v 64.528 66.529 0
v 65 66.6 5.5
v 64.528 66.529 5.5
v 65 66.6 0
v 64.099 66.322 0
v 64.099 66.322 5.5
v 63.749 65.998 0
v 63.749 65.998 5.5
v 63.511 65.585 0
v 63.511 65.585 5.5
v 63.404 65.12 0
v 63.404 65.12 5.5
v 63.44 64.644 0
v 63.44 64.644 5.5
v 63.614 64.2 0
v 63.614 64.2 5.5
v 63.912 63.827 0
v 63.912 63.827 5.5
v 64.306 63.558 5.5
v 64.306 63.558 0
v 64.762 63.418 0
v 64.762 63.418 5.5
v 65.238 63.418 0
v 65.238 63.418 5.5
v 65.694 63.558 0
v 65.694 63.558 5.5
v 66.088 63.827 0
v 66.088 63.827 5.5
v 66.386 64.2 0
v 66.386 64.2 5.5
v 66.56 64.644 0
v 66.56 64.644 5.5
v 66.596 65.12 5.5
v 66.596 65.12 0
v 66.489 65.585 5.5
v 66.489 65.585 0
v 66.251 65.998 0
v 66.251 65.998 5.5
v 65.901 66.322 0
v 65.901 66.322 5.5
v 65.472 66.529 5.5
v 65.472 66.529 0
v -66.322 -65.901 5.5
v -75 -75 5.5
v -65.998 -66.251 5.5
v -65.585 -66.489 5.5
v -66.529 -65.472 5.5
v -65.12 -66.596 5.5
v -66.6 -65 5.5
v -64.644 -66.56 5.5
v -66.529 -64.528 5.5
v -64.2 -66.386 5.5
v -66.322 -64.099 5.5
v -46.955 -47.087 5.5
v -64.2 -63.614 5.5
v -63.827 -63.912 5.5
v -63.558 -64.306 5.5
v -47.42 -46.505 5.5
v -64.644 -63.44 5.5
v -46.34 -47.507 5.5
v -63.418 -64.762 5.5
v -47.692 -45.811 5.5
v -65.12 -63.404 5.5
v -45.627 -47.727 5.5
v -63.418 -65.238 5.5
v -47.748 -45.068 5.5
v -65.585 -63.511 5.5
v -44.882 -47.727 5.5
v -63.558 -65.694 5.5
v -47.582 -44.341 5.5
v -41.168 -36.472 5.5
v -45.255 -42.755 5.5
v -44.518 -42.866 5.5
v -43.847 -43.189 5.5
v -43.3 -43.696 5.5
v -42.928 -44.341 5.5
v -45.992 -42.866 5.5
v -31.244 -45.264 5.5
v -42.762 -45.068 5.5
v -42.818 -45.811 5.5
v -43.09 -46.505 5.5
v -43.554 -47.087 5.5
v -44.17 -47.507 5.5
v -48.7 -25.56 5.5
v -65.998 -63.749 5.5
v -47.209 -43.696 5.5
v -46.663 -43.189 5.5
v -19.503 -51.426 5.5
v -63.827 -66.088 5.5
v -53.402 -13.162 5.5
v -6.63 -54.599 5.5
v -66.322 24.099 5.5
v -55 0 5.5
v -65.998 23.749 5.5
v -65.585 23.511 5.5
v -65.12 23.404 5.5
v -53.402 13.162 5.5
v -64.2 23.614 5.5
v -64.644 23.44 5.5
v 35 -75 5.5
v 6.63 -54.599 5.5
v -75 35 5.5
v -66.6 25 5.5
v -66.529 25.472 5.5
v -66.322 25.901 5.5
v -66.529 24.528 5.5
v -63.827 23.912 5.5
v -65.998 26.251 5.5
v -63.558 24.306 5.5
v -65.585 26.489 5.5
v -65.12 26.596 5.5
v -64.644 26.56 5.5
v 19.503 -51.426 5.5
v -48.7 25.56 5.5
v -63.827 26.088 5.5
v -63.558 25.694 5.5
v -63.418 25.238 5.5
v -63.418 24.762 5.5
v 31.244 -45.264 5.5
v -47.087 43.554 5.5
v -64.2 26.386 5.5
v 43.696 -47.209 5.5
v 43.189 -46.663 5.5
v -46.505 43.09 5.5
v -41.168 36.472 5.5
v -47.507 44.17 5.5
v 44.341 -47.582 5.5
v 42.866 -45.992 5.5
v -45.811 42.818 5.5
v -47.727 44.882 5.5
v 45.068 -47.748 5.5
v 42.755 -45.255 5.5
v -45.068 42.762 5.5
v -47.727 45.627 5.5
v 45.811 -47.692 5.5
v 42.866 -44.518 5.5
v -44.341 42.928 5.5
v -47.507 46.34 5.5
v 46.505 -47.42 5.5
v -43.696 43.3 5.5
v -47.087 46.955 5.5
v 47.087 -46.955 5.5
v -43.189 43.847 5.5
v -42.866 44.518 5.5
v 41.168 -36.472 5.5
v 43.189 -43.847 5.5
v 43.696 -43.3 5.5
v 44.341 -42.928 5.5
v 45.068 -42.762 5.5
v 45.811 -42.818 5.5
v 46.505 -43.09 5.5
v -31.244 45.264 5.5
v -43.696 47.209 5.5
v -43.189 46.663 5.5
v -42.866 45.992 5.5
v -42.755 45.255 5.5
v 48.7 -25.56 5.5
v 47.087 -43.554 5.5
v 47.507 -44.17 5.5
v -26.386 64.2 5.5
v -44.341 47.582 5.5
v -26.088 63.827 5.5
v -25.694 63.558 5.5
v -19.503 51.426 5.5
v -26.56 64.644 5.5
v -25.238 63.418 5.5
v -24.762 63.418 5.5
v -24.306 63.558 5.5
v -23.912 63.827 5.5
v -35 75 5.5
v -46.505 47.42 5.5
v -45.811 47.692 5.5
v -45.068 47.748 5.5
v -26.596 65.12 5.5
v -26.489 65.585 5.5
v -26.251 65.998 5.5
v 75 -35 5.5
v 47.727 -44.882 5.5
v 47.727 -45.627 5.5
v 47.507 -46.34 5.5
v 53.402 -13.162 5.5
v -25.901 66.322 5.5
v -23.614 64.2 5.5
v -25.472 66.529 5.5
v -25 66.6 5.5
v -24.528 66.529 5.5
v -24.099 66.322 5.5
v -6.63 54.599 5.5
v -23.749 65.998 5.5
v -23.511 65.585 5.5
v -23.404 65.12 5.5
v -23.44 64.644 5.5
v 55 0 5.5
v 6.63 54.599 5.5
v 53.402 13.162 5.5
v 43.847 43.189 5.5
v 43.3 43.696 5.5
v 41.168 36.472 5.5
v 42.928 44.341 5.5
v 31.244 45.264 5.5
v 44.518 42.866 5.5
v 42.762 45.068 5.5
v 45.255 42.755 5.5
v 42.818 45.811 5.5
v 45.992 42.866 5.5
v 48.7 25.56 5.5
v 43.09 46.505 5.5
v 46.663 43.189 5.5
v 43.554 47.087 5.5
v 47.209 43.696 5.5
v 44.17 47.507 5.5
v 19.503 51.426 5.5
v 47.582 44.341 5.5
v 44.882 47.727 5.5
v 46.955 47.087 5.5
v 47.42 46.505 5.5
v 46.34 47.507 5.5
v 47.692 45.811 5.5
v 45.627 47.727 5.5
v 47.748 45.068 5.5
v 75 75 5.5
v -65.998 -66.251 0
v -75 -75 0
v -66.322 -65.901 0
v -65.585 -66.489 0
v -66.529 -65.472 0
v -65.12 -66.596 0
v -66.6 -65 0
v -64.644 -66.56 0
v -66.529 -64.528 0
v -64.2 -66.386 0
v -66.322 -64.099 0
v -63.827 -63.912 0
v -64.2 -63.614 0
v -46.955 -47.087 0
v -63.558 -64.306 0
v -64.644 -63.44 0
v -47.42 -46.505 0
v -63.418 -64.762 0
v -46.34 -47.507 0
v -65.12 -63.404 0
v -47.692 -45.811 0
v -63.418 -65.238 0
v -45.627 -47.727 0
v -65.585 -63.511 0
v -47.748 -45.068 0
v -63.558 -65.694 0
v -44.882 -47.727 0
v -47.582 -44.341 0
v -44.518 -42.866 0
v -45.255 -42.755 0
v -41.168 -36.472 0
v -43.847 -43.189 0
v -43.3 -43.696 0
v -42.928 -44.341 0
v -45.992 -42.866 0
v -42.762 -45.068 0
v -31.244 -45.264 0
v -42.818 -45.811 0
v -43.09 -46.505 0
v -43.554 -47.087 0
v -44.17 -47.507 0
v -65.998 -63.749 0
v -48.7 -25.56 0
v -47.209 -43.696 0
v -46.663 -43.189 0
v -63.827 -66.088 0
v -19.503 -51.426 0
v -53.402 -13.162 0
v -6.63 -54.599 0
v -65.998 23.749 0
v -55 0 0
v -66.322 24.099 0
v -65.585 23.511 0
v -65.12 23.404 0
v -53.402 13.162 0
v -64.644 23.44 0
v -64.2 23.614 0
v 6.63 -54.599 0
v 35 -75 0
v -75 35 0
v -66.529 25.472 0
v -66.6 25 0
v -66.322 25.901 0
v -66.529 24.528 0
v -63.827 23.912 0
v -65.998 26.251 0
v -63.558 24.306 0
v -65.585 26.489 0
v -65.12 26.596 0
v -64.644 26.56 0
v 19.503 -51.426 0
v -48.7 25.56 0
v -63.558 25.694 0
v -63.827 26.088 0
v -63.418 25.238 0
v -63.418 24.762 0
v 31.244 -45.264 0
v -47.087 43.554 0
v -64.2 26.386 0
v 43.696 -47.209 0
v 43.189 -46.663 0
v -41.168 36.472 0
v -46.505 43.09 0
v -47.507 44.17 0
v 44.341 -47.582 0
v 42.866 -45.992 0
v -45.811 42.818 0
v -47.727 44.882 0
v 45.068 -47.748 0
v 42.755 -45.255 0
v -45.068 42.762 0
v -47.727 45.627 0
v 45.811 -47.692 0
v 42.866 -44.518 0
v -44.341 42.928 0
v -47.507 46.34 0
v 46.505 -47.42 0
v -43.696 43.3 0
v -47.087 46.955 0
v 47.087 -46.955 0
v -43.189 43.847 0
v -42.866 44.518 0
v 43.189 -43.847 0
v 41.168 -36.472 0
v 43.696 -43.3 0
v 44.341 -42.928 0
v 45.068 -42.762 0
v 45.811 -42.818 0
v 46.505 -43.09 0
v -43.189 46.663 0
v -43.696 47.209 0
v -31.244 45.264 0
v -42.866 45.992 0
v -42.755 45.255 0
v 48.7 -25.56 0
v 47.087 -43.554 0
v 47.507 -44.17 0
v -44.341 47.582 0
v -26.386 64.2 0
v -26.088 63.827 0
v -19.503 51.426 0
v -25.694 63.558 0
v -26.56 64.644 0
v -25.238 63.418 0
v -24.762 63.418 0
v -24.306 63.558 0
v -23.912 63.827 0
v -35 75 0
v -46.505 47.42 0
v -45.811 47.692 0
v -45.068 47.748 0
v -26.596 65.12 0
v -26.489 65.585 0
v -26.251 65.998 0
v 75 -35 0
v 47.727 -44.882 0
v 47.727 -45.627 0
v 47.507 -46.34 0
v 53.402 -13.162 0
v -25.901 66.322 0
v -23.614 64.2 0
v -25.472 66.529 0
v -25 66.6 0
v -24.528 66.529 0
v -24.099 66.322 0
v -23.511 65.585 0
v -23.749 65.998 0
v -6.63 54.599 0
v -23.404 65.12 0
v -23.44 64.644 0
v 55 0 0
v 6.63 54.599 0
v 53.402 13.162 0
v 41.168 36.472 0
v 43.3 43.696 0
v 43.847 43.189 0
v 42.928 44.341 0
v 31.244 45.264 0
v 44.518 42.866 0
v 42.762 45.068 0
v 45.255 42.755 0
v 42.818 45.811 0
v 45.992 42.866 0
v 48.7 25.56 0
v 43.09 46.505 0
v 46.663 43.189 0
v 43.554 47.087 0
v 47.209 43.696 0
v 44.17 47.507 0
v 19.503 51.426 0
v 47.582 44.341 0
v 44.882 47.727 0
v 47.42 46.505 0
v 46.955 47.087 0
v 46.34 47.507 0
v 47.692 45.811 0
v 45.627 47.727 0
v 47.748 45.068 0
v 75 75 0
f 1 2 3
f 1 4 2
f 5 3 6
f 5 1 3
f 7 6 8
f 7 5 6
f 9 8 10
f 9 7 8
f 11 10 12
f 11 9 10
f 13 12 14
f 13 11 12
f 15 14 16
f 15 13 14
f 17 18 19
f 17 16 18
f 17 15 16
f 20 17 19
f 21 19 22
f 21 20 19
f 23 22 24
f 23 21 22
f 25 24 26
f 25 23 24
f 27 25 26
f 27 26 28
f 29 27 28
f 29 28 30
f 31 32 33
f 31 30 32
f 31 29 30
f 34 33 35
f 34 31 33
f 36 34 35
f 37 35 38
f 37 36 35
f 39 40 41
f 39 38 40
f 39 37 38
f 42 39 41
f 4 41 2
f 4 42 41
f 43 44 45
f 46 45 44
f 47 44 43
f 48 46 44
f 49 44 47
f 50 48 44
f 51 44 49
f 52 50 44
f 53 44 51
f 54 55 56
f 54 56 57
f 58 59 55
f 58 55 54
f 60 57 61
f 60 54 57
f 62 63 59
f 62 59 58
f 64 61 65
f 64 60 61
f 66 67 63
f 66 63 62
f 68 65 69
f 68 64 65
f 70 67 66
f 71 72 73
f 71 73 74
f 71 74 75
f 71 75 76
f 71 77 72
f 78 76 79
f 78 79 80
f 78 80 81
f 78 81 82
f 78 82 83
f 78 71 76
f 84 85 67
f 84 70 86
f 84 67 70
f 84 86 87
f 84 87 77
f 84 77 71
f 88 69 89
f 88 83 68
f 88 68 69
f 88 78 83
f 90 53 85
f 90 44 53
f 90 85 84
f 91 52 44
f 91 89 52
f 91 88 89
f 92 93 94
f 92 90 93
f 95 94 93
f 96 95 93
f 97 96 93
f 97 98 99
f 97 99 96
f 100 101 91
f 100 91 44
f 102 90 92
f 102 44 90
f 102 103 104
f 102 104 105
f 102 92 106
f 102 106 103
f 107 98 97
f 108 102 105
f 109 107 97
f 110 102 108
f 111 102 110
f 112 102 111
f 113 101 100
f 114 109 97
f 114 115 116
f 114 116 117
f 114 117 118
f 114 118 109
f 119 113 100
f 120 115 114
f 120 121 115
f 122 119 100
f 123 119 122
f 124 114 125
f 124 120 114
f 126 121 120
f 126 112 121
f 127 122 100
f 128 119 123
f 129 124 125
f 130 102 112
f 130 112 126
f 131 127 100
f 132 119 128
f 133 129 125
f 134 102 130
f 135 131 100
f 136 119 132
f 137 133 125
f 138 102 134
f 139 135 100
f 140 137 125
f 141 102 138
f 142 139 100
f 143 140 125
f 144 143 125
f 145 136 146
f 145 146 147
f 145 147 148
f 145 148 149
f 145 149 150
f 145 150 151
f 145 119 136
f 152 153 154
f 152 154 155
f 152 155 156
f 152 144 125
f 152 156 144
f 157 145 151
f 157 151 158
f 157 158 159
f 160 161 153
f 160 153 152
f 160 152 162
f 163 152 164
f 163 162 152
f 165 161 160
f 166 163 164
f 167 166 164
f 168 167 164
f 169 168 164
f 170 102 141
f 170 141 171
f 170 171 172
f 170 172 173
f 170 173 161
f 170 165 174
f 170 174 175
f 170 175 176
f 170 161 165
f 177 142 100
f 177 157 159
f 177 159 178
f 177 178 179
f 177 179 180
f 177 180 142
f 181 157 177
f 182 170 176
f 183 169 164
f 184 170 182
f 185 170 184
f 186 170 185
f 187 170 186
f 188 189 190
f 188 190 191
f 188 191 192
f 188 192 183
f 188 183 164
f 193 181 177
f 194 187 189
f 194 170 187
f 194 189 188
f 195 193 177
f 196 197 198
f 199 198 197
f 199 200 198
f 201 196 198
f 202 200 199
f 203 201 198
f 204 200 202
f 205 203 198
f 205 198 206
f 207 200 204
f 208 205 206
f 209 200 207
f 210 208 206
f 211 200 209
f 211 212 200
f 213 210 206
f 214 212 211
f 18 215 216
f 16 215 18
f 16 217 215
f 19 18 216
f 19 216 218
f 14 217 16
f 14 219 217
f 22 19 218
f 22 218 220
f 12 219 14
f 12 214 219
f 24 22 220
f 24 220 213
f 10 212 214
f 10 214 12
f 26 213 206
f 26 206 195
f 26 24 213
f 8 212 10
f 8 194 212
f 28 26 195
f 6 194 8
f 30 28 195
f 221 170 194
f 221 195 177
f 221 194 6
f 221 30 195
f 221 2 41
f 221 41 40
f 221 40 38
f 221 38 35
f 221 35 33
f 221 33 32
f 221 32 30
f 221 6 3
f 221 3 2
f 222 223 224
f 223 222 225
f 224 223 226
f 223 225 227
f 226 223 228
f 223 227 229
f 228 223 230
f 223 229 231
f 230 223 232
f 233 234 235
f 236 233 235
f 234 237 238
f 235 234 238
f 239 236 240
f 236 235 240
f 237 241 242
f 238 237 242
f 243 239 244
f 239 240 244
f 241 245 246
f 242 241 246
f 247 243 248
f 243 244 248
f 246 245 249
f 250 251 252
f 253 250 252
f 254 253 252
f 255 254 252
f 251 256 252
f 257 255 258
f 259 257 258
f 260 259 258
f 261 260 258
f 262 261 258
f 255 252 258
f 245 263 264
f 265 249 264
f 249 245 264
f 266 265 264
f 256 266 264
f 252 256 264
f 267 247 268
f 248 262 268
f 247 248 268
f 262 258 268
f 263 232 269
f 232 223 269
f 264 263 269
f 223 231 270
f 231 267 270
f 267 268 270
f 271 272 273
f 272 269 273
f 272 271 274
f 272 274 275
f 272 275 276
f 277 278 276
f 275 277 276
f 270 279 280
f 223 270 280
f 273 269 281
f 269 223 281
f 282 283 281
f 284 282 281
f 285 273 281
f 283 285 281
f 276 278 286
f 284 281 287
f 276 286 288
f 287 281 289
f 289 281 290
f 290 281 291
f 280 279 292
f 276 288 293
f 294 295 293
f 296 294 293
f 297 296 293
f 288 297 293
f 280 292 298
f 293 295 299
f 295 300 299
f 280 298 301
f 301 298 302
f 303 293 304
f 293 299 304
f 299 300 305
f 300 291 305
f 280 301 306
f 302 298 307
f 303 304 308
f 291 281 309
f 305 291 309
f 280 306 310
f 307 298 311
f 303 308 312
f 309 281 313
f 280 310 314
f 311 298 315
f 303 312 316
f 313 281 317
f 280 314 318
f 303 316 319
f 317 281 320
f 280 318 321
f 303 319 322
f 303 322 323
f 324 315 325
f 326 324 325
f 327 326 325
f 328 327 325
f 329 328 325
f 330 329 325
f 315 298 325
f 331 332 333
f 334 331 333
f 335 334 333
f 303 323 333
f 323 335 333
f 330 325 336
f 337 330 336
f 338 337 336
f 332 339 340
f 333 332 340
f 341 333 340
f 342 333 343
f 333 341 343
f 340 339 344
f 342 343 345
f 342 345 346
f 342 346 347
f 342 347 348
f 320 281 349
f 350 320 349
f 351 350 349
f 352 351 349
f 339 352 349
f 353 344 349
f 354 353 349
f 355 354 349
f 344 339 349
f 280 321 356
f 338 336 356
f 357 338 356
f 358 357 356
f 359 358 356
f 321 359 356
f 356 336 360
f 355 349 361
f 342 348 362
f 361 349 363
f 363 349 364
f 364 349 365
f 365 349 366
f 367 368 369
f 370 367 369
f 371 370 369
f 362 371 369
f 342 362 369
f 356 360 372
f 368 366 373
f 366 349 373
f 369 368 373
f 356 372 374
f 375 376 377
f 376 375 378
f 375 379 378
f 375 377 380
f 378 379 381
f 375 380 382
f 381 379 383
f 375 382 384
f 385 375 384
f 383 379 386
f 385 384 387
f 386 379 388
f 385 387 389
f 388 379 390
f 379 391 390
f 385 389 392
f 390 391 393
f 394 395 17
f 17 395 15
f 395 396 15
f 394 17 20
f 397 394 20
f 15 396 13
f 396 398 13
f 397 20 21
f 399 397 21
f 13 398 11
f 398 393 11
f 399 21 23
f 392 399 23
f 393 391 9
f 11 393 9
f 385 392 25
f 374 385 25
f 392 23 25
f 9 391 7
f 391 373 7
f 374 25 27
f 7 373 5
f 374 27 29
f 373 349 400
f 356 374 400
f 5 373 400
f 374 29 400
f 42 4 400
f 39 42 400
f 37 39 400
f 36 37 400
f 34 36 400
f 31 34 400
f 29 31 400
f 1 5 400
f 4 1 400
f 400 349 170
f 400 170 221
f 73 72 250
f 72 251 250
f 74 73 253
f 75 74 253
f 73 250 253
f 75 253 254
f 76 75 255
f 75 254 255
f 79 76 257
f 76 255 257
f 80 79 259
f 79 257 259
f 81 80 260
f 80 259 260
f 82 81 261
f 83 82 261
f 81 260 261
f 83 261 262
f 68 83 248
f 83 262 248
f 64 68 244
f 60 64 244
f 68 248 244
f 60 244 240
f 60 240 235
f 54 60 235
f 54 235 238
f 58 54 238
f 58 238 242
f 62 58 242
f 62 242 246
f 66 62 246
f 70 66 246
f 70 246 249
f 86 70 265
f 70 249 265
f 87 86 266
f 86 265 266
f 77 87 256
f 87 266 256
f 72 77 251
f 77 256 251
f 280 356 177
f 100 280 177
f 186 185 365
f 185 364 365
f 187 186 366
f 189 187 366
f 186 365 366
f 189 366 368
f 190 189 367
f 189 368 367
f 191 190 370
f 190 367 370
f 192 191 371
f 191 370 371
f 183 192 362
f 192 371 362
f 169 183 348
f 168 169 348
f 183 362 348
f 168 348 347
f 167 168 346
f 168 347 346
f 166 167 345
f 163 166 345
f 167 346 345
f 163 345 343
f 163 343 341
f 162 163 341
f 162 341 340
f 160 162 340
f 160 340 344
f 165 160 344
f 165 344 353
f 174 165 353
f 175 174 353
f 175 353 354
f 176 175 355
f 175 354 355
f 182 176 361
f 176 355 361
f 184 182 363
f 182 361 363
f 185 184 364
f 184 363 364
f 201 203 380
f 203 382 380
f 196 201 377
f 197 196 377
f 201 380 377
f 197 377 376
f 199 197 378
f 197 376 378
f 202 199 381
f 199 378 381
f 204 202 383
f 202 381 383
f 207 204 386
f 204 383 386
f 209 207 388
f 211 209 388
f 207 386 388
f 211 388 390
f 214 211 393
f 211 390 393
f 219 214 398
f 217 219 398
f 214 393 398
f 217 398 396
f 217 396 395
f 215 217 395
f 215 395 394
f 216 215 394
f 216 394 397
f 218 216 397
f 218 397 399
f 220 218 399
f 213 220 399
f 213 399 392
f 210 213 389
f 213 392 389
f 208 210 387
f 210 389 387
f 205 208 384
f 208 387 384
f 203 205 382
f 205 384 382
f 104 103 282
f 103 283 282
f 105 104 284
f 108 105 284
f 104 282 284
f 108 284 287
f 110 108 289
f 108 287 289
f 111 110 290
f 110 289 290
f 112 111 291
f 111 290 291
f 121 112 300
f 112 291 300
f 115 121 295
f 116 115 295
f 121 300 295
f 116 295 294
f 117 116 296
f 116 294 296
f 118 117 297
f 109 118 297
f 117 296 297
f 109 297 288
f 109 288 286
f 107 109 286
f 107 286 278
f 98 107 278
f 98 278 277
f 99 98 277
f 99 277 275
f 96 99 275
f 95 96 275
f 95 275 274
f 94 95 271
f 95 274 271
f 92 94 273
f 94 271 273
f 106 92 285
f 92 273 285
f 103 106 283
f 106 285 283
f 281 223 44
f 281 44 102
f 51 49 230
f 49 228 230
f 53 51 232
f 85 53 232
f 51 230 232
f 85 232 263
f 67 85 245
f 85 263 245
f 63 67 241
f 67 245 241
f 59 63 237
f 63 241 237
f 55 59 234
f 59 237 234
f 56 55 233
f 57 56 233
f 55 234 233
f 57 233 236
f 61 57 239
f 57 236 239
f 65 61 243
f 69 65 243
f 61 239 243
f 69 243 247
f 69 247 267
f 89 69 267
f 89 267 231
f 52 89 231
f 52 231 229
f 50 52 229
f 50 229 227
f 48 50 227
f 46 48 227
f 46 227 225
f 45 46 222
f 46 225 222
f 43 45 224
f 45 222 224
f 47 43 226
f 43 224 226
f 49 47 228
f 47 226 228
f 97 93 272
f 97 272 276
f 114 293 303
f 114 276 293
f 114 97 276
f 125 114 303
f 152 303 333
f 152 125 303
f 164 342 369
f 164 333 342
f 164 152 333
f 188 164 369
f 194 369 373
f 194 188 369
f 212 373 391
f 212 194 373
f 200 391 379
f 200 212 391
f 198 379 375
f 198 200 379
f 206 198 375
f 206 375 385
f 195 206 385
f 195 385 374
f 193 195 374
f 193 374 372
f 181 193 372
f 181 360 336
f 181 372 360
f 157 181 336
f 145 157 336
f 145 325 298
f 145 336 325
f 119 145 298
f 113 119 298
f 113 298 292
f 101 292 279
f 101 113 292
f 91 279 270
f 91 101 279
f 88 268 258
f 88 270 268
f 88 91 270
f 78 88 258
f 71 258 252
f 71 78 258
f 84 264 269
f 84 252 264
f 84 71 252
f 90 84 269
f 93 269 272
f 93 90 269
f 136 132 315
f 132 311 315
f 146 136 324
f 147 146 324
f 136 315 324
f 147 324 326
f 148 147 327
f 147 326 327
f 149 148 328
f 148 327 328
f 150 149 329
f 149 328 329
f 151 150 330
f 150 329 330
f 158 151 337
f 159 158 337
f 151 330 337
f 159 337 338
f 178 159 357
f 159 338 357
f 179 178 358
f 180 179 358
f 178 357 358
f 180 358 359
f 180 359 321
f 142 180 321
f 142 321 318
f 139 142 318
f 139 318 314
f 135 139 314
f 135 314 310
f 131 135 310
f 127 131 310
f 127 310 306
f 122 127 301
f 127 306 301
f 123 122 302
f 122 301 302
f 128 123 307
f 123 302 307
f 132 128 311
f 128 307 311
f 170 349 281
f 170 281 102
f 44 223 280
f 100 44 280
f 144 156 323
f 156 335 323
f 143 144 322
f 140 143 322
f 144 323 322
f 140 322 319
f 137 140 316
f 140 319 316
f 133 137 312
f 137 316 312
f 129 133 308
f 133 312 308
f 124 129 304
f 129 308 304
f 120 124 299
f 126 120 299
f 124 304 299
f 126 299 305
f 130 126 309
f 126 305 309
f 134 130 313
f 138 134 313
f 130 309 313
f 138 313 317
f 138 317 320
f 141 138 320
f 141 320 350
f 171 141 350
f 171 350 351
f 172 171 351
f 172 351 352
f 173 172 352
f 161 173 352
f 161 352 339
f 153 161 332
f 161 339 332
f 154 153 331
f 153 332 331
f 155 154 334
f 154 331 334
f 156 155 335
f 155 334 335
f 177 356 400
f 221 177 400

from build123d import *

# Parameters (mm, degrees)
SKETCH_1_W                       = 150
SKETCH_1_H                       = 150
EXTRUDE_1_DEPTH                  = 5.5
SKETCH_2_R                       = 2.5
CUT_EXTRUDE_1_DEPTH              = 107.208521315
CUT_EXTRUDE_2_DEPTH              = 107.208521315
CUT_EXTRUDE_2_DEPTH_BACK         = 107.208521315
SKETCH_3_R                       = 55
PATTERN_CIRCULAR_1_COUNT         = 4
SKETCH_4_R                       = 1.6
CUT_EXTRUDE_3_DEPTH              = 107.208521315
CHAMFER_1_SIZE                   = 40
CHAMFER_2_SIZE                   = 40
PATTERN_LINEAR_1_COUNT           = 2
PATTERN_LINEAR_1_PITCH           = 90
PATTERN_LINEAR_2_COPY_1_SKETCH_R = 1.6
PATTERN_LINEAR_2_COPY_1_DEPTH    = 107.208521315
PATTERN_LINEAR_2_COPY_2_SKETCH_R = 1.6
PATTERN_LINEAR_2_COPY_2_DEPTH    = 107.208521315


with BuildPart() as part:
    # ｽｹｯﾁ1 → ﾎﾞｽ - 押し出し1 (new body)
    with BuildSketch(Plane.XY):
        Rectangle(SKETCH_1_W, SKETCH_1_H)
    extrude(amount=EXTRUDE_1_DEPTH)

    # ｽｹｯﾁ2 → ｶｯﾄ - 押し出し1 (cut, symmetric)
    with BuildSketch(Plane(origin=(0, 0, 0), x_dir=(-1, 0, 0), z_dir=(0, 0, -1))):
        with Locations((-45.254833996, -45.254833996)):
            Circle(SKETCH_2_R)
    cut_extrude_1 = extrude(amount=CUT_EXTRUDE_1_DEPTH, both=True, mode=Mode.SUBTRACT)

    # ｽｹｯﾁ3 → ｶｯﾄ - 押し出し2 (cut, two sides: drawn at the far end of the back side and taken through both)
    with BuildSketch(Plane(origin=(0, 0, 0), x_dir=(-1, 0, 0), z_dir=(0, 0, -1)).offset(-CUT_EXTRUDE_2_DEPTH_BACK)):
        Circle(SKETCH_3_R)
    extrude(amount=CUT_EXTRUDE_2_DEPTH + CUT_EXTRUDE_2_DEPTH_BACK, mode=Mode.SUBTRACT)

    # 円形ﾊﾟﾀｰﾝ1: ｶｯﾄ - 押し出し1 ×4 about axis
    pattern_circular_1_axis = Axis((0, 0, 0), (0, 0, 1))
    for i in range(1, PATTERN_CIRCULAR_1_COUNT):
        add(cut_extrude_1.rotate(pattern_circular_1_axis, i * 360 / PATTERN_CIRCULAR_1_COUNT), mode=Mode.SUBTRACT)

    # ｽｹｯﾁ4 → ｶｯﾄ - 押し出し3 (cut, symmetric)
    with BuildSketch(Plane(origin=(0, 0, 0), x_dir=(-1, 0, 0), z_dir=(0, 0, -1))):
        with Locations((65, -65)):
            Circle(SKETCH_4_R)
    cut_extrude_3 = extrude(amount=CUT_EXTRUDE_3_DEPTH, both=True, mode=Mode.SUBTRACT)

    # 面取り1
    chamfer_1_edges = [part.edges().sort_by_distance(p)[0] for p in [
        (-75, 75, 2.75),
    ]]
    chamfer(chamfer_1_edges, length=CHAMFER_1_SIZE)

    # 面取り2
    chamfer_2_edges = [part.edges().sort_by_distance(p)[0] for p in [
        (75, -75, 2.75),
    ]]
    chamfer(chamfer_2_edges, length=CHAMFER_2_SIZE)

    # 直線ﾊﾟﾀｰﾝ1: ｶｯﾄ - 押し出し3 ×2
    with Locations(*[(0, i * PATTERN_LINEAR_1_PITCH, 0) for i in range(1, PATTERN_LINEAR_1_COUNT)]):
        add(cut_extrude_3, mode=Mode.SUBTRACT)

    # ﾐﾗｰ1: ｶｯﾄ - 押し出し3 across plane
    add(cut_extrude_3.mirror(Plane(origin=(0, 0, 0), x_dir=(0, 0, 1), z_dir=(-0.7071067811865475, -0.7071067811865476, 0))), mode=Mode.SUBTRACT)

    # 直線ﾊﾟﾀｰﾝ2 copy 1 sketch → 直線ﾊﾟﾀｰﾝ2 copy 1 (cut, symmetric)
    with BuildSketch(Plane(origin=(-90, 0, 0), x_dir=(0, 1, 0), z_dir=(0, 0, -1))):
        with Locations((65, 65)):
            Circle(PATTERN_LINEAR_2_COPY_1_SKETCH_R)
    extrude(amount=PATTERN_LINEAR_2_COPY_1_DEPTH, both=True, mode=Mode.SUBTRACT)

    # 直線ﾊﾟﾀｰﾝ2 copy 2 sketch → 直線ﾊﾟﾀｰﾝ2 copy 2 (cut, symmetric)
    with BuildSketch(Plane(origin=(-90, 0, 0), x_dir=(-1, 0, 0), z_dir=(0, 0, -1))):
        with Locations((65, -65)):
            Circle(PATTERN_LINEAR_2_COPY_2_SKETCH_R)
    extrude(amount=PATTERN_LINEAR_2_COPY_2_DEPTH, both=True, mode=Mode.SUBTRACT)


solid = part.part
